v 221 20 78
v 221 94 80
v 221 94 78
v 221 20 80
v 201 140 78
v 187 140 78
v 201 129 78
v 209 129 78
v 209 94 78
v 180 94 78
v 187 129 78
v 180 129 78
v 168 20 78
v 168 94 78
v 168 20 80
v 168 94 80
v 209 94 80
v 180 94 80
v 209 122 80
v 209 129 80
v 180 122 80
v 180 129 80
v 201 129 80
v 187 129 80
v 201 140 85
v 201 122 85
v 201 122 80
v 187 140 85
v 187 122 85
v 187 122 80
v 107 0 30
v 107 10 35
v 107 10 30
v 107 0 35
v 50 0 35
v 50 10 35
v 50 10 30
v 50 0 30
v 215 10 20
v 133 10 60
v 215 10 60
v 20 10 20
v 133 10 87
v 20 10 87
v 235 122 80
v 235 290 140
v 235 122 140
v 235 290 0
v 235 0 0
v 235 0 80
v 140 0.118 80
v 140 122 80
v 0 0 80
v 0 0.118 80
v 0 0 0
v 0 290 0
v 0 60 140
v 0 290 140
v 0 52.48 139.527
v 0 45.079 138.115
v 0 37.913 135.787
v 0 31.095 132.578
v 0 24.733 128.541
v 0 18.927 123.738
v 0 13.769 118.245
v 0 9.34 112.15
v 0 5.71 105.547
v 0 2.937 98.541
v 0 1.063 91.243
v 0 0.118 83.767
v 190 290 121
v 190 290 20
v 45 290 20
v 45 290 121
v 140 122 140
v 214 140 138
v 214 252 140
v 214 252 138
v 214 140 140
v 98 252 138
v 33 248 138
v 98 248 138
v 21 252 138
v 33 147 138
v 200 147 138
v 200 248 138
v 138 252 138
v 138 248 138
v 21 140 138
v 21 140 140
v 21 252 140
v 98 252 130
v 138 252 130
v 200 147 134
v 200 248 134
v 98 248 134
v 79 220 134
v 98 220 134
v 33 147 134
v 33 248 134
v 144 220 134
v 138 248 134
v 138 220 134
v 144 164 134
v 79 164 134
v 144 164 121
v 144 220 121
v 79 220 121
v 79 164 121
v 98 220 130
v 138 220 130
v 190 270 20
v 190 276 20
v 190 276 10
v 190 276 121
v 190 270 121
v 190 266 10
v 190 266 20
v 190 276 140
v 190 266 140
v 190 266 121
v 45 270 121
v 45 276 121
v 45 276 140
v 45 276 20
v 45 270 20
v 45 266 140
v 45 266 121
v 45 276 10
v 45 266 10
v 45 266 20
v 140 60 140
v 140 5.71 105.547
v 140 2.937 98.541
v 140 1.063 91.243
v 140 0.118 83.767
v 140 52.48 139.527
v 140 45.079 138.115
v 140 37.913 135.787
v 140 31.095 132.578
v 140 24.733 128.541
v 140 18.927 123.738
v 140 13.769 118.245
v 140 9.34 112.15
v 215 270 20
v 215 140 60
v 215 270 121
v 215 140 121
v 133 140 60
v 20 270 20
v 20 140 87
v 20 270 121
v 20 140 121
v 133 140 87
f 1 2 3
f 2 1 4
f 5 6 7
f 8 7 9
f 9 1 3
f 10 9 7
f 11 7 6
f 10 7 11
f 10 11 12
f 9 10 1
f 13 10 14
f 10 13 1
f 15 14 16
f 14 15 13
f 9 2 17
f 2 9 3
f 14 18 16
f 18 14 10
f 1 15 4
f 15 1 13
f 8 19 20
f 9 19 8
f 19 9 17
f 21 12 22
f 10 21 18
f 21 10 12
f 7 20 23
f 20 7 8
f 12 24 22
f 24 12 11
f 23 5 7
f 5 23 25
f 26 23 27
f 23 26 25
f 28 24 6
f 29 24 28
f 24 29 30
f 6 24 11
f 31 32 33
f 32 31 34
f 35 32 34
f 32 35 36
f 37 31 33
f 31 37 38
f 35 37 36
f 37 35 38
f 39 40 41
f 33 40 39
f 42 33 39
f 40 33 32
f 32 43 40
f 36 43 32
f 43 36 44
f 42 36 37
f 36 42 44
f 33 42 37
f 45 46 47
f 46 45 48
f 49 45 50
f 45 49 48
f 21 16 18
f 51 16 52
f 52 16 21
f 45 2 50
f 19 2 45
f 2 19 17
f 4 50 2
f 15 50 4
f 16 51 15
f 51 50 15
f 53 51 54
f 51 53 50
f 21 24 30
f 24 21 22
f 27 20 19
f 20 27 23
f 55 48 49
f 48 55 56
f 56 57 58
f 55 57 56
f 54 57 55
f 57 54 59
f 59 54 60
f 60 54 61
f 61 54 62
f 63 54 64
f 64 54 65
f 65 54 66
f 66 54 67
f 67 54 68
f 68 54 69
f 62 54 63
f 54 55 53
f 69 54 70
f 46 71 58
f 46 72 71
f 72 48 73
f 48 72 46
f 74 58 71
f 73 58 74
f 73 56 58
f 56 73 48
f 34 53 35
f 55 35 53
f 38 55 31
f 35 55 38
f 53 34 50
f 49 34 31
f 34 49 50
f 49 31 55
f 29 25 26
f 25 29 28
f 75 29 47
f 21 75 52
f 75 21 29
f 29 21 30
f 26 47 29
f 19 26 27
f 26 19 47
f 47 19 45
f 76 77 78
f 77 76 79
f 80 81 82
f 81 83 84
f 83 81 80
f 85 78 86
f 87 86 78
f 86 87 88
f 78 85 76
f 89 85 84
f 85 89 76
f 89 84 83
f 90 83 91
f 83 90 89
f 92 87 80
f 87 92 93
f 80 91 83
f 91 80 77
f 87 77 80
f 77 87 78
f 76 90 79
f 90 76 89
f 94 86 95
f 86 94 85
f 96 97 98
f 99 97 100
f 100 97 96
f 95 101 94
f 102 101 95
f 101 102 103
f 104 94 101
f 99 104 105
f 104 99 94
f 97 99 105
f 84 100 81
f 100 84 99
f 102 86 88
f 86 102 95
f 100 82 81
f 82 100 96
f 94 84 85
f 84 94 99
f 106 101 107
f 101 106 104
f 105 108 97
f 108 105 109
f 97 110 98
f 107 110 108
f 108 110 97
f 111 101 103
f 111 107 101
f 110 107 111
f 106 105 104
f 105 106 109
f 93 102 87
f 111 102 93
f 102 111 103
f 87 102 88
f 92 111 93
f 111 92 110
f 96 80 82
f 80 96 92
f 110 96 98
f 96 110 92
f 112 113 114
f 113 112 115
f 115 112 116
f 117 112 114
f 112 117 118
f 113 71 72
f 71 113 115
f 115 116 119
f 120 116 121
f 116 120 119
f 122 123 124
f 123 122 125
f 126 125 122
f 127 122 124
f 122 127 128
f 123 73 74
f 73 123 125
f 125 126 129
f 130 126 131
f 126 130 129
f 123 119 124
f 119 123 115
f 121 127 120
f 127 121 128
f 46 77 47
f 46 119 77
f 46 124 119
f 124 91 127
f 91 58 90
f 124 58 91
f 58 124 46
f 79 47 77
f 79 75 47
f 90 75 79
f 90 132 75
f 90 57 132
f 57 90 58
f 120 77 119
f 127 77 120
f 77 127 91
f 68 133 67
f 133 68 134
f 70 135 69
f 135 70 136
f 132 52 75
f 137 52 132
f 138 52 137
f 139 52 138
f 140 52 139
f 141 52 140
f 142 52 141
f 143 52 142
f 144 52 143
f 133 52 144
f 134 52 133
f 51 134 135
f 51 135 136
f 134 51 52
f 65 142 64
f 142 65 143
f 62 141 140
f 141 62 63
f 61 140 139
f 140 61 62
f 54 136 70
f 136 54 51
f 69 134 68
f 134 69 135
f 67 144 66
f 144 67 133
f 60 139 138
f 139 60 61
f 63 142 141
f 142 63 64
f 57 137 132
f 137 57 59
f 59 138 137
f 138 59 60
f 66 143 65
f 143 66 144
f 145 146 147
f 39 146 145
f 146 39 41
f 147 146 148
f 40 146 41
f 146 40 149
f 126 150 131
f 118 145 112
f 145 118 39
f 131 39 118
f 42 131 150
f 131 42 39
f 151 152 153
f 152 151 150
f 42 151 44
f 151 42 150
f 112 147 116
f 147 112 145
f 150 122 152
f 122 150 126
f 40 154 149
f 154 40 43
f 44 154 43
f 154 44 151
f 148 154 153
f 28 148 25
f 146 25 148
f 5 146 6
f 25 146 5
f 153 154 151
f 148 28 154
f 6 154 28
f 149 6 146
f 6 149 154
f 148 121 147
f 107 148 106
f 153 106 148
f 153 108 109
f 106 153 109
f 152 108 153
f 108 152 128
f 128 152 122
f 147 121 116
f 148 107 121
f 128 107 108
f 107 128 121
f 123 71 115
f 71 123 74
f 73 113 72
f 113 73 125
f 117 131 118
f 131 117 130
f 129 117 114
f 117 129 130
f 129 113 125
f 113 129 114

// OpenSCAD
difference() {
    union() {
        difference() {
            cube([235,290,80]); // bottom
            
            union() {
                translate([168,20,78])
                cube([53,74,3]);    // nfc
                translate([180,94,78])
                cube([29,35,3]);    // nfc module
                translate([187,122,78])
                cube([14,20,3]);    // nfc line
                
                translate([50,-1,30])
                cube([57,11,5]);    // printer
            }
        }
        
        translate([0,60,80])
        rotate(a=90,v=[0,1,0]) {
            cylinder(r=60,h=140,$fn=50);    // front
        }
        
        difference() {
            translate([0,60,80])
            cube([140,65,60]);  // front2
        }
        
        difference() {
            translate([0,122,80])
            cube([235,168,60]); // back
            
            union() {
                translate([187,122,79])
                cube([14,20,6]);    // nfc line
                
                translate([21,140,138])
                cube([193,112,3]);  // lcd
                translate([33,147,134])
                cube([167,101,5]);  // lcd bottom
                translate([79,164,120])
                cube([65,56,15]);   // lcd module
                translate([98,220,130])
                cube([40,32,10]);    // lcd line
                
                translate([45,266,120])
                cube([145,10,21]);  // back lid
            }
        }
    }
    
    union() {
        translate([20,10,20])
        cube([195,260,40]); // inside bottom
        
        translate([20,10,60])
        cube([113,130,27]); // inside printer
        translate([20,140,60])
        cube([195,130,61]); // inside lcd
        
        translate([45,266,20])
        cube([145,25,101]); // inside back lid
        translate([45,266,10])
        cube([145,10,11]);  // inside bottom lid
    }
}
